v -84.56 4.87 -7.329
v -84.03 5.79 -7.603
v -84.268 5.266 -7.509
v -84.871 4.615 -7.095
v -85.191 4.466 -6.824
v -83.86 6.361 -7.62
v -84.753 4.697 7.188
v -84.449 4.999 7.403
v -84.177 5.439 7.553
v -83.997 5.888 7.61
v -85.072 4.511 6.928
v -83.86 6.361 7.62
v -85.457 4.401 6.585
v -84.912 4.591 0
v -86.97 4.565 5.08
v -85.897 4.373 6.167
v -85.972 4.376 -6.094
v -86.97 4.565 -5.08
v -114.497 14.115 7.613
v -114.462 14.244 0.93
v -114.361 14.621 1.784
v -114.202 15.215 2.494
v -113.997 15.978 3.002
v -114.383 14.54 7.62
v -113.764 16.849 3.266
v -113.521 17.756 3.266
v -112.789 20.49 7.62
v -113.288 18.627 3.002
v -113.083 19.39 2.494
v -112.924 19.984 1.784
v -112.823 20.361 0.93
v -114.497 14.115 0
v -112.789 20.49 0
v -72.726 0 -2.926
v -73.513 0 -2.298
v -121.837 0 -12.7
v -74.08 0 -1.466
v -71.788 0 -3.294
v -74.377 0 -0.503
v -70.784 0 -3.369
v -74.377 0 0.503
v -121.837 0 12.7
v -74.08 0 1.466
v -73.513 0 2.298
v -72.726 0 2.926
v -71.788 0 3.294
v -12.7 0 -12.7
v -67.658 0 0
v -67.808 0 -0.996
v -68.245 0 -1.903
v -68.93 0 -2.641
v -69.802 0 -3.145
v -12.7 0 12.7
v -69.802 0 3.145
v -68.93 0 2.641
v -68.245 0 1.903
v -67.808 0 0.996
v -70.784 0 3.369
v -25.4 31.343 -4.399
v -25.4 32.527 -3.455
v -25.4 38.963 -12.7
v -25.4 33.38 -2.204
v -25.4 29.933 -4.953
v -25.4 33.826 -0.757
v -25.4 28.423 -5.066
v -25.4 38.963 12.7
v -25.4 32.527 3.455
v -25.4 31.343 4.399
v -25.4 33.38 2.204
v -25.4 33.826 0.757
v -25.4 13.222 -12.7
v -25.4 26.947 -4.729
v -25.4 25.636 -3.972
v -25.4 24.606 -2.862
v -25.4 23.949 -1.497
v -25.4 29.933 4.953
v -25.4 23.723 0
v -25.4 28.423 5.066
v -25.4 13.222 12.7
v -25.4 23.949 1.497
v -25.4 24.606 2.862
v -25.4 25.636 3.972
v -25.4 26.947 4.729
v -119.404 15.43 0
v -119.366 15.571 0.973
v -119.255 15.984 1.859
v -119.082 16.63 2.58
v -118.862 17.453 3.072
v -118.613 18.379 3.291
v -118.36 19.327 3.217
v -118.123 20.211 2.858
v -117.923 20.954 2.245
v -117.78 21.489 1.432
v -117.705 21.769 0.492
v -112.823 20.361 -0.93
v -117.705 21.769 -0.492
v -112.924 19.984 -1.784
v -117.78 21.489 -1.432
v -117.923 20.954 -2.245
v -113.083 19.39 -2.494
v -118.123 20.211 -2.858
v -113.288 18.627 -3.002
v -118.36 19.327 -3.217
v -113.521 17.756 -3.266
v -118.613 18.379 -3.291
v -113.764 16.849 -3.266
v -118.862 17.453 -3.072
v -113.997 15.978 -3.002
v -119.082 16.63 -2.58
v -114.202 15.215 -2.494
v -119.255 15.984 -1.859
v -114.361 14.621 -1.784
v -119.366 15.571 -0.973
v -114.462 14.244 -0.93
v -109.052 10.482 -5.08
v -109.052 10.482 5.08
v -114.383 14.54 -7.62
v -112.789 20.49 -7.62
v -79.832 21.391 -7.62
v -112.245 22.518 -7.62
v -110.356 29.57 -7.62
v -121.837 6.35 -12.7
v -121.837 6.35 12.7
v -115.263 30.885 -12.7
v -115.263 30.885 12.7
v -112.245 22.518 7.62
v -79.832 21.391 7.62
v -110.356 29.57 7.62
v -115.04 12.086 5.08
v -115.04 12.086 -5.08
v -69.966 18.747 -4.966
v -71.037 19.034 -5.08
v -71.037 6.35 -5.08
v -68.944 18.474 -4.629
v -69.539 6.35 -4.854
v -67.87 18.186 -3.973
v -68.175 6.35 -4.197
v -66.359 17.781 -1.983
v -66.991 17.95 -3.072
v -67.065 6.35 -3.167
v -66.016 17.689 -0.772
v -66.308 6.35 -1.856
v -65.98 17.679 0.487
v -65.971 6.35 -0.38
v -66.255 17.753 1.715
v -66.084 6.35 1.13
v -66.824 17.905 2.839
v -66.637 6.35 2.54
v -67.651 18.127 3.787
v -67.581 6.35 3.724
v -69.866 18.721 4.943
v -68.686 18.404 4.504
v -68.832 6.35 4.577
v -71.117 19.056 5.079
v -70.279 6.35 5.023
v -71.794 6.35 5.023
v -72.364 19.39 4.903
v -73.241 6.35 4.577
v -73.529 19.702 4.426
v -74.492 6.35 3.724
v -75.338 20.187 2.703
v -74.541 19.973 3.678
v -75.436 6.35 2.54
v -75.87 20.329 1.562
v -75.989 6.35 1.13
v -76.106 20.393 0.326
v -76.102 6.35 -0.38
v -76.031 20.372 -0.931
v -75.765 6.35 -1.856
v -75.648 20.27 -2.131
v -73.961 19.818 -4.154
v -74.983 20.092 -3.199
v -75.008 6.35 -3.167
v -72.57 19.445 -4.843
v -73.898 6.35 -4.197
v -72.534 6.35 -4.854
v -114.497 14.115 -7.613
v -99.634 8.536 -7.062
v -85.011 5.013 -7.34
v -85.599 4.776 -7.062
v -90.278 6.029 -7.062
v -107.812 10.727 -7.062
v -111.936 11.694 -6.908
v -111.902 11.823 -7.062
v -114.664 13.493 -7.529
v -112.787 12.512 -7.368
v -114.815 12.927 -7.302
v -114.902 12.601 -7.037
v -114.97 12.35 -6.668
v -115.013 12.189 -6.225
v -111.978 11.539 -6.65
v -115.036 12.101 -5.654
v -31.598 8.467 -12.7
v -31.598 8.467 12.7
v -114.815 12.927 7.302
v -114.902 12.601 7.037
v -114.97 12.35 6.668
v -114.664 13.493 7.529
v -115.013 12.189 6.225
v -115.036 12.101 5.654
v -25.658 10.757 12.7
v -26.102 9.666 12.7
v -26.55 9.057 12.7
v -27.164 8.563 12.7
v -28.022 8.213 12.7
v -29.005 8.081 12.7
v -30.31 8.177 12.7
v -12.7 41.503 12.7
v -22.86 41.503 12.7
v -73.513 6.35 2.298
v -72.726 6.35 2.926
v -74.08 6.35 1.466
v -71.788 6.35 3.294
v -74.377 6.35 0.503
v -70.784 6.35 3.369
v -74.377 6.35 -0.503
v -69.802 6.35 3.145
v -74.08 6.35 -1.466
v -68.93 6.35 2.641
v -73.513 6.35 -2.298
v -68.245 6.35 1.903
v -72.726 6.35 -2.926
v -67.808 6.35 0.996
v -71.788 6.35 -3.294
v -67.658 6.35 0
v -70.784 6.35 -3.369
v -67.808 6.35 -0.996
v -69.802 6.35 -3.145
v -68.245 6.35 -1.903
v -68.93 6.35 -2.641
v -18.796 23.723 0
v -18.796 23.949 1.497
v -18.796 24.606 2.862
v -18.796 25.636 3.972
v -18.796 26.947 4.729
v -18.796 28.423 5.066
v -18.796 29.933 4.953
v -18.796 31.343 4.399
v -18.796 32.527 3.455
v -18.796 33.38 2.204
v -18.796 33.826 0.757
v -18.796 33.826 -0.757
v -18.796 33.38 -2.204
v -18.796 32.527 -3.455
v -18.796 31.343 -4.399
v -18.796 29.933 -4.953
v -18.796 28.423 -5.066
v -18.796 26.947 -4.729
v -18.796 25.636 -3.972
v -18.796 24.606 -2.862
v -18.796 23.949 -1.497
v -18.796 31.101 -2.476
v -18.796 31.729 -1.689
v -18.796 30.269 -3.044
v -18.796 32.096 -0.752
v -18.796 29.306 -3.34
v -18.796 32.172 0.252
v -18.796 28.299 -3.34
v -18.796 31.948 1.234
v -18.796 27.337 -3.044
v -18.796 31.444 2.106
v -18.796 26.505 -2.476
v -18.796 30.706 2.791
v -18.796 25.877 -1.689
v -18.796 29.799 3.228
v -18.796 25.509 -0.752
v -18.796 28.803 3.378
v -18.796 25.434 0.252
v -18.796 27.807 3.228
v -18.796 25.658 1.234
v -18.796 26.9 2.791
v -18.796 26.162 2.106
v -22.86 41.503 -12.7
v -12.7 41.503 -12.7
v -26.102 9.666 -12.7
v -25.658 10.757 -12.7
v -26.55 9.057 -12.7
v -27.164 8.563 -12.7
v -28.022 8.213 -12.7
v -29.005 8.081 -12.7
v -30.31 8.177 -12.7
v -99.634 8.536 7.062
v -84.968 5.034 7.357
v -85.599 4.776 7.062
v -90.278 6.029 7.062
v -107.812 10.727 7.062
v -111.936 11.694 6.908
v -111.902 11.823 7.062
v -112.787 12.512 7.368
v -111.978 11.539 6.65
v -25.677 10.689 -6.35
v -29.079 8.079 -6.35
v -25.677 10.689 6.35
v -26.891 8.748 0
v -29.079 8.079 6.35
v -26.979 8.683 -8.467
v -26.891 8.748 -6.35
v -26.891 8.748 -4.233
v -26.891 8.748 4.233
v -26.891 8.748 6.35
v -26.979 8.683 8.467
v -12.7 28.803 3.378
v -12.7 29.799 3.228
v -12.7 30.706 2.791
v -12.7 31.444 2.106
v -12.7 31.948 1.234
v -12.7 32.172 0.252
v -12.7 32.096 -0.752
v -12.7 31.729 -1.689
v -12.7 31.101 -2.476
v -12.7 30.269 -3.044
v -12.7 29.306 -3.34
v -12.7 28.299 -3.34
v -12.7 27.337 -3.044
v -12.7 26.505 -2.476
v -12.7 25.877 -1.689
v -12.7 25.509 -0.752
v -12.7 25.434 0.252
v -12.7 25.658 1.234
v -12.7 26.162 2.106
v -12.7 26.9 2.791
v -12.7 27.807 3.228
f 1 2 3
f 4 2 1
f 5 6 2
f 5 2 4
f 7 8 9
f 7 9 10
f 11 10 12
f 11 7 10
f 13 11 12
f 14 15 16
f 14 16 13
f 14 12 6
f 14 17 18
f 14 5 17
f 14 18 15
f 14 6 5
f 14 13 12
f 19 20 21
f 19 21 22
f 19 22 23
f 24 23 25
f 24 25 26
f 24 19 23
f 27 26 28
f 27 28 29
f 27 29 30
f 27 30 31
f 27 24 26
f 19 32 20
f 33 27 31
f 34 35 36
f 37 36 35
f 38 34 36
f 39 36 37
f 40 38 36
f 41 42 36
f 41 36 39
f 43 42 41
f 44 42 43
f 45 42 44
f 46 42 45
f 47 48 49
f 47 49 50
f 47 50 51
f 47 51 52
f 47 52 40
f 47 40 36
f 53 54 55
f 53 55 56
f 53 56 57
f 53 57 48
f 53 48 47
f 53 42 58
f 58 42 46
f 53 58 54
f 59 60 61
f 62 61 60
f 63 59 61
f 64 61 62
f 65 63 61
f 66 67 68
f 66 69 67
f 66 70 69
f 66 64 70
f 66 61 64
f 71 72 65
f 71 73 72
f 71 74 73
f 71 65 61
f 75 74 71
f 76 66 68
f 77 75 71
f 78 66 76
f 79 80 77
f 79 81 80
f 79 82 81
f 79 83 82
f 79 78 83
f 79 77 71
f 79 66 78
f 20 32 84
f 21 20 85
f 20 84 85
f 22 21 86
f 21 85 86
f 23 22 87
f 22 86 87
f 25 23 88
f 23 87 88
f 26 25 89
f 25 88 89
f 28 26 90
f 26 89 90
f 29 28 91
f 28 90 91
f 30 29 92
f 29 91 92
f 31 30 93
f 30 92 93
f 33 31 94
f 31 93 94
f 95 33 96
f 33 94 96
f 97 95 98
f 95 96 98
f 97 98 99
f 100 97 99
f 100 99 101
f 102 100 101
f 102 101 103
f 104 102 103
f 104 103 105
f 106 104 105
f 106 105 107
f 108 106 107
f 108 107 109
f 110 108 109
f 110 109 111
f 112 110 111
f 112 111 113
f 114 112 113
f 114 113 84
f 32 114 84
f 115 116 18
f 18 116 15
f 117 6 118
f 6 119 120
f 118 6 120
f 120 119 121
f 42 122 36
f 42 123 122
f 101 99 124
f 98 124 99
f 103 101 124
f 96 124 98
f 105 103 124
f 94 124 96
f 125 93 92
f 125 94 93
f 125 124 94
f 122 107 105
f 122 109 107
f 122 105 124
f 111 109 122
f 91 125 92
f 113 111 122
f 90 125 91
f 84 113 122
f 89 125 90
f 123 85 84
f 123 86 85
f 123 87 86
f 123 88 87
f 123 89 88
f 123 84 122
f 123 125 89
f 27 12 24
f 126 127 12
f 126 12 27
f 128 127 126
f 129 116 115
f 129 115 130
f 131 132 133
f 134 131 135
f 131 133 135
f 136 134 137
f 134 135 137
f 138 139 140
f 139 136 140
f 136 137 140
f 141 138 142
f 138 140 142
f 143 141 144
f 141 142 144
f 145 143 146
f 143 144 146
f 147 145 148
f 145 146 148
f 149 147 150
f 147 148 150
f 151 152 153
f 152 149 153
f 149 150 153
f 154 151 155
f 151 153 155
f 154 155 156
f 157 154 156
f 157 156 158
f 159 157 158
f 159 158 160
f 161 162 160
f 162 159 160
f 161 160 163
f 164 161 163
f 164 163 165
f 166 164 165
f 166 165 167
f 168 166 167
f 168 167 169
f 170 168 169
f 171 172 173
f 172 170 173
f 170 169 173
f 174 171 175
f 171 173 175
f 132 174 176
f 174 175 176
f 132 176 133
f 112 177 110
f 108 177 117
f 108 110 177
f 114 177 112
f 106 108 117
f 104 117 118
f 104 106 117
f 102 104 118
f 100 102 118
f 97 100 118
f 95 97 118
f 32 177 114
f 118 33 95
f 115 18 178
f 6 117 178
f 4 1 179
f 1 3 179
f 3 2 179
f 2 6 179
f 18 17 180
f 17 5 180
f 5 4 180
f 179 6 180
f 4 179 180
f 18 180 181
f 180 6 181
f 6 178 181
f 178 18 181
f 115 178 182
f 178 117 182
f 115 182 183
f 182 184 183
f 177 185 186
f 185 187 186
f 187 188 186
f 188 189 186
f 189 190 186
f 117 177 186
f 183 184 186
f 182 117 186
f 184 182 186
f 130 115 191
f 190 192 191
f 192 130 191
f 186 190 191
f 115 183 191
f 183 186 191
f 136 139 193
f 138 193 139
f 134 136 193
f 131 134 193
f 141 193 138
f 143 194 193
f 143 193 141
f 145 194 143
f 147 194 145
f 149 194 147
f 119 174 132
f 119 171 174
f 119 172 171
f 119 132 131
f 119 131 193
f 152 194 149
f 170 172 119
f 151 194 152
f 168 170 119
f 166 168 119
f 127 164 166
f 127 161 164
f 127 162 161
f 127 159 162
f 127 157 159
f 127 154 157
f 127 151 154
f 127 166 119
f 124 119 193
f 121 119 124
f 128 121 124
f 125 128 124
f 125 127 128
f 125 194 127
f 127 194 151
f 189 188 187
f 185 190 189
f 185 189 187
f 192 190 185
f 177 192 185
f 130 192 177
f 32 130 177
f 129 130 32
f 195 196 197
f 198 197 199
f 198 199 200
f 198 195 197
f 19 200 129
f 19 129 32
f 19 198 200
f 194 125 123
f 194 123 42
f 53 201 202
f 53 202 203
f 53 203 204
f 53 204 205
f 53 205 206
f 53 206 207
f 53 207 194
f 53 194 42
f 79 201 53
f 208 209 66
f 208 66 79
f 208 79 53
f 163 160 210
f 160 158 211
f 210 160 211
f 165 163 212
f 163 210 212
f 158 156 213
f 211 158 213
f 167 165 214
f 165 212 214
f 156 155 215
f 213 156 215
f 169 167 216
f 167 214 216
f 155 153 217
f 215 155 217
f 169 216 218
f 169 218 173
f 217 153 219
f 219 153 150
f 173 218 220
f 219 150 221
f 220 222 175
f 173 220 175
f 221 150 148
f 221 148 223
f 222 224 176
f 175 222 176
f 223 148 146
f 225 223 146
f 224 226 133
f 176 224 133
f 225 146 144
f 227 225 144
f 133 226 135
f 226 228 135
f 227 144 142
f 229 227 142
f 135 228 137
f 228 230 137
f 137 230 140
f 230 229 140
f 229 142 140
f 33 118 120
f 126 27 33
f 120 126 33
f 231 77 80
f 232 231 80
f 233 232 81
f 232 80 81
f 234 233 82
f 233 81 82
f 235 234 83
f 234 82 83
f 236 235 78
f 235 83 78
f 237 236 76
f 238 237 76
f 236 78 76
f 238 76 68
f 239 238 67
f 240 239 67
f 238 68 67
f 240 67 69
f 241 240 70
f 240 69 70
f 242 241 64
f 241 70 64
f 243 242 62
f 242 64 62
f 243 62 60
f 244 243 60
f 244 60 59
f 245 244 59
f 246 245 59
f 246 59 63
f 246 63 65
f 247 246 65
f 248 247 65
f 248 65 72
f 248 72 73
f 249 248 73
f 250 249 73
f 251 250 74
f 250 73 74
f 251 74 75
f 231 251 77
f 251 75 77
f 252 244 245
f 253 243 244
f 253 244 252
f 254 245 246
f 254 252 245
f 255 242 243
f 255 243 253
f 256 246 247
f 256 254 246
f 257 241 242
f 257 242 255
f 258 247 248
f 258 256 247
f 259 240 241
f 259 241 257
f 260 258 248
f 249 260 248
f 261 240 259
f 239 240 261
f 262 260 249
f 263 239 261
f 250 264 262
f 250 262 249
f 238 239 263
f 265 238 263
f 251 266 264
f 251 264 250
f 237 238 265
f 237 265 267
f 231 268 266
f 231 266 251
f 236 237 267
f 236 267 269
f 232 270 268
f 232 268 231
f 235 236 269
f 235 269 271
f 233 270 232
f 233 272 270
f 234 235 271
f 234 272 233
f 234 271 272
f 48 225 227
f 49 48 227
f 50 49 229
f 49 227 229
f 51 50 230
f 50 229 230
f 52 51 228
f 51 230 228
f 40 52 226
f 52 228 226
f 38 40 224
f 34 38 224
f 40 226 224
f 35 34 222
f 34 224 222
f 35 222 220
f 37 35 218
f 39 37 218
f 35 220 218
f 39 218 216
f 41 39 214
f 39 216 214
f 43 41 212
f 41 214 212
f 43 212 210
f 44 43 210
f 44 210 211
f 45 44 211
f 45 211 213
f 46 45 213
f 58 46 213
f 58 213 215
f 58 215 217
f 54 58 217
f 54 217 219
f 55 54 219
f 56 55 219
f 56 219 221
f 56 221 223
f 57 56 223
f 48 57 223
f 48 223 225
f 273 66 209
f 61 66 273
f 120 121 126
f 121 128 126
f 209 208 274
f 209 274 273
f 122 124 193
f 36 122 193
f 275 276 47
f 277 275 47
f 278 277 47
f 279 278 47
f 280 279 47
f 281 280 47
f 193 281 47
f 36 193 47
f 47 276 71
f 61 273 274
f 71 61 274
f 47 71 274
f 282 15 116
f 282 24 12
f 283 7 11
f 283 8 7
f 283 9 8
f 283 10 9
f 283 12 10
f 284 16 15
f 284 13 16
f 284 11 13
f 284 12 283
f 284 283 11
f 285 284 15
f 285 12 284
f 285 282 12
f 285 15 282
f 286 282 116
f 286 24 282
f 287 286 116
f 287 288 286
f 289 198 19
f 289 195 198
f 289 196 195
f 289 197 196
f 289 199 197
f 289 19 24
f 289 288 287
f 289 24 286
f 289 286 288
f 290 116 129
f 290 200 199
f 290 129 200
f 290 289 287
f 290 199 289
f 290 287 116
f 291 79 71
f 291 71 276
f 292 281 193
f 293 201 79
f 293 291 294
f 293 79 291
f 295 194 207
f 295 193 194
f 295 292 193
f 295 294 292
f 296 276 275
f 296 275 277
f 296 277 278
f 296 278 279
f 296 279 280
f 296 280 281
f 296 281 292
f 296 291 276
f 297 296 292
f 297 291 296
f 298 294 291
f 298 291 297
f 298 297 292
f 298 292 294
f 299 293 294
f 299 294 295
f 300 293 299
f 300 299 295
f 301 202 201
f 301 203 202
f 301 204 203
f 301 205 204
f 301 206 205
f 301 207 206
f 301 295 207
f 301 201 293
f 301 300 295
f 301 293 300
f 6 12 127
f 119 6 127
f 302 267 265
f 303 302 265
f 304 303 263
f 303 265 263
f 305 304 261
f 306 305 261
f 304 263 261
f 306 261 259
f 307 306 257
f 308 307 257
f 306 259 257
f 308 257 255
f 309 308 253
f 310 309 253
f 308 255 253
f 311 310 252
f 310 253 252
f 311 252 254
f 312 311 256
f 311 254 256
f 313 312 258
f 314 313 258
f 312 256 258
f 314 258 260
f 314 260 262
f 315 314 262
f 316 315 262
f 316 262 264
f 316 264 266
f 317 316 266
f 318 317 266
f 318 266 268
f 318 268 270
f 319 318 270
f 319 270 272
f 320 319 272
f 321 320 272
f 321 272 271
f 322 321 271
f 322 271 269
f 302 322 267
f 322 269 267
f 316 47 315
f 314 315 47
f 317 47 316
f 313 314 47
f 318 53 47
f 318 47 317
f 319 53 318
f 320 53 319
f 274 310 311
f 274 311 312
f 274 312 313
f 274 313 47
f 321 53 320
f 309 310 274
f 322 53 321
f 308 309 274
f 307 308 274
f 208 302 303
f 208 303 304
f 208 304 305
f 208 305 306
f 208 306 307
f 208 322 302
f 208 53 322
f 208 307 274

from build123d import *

# Parameters (mm, degrees)
BOSS_EXTRUDE2_DEPTH         = 12.7
CUT_EXTRUDE1_DEPTH          = 7.62
SKETCH3_R                   = 3.3
CUT_EXTRUDE3_DEPTH          = 5.08
FILLET1_SIZE                = 2.54
F_1_4_CLEARANCE_HOLE1_D     = 6.7564
SKETCH8_R                   = 5.08
CUT_EXTRUDE4_DEPTH          = 125.929525349
CUT_EXTRUDE5_DEPTH          = 129.230913422
BOSS_EXTRUDE3_DEPTH         = 25.4
F_1_4_CLEARANCE_HOLE2_D     = 6.7564
F_1_4_CLEARANCE_HOLE2_DEPTH = 12.7
F_1_4_CLEARANCE_HOLE2_TIP   = 2.029827343
SKETCH14_R                  = 5.08
CUT_EXTRUDE6_DEPTH          = 6.604
CHAMFER1_SIZE               = 2.54


with BuildPart() as part:
    # Sketch1 → Boss-Extrude2 (new, symmetric)
    with BuildSketch(Plane.XY):
        Polygon((-121.836586579, 6.35), (-121.836586579, 0), (0, 0), (-115.262582833, 30.884515988), align=None)
    extrude(amount=BOSS_EXTRUDE2_DEPTH, both=True)

    # Sketch2 → Cut-Extrude1 (cut, symmetric)
    with BuildSketch(Plane.XY):
        Polygon((-112.78857866, 20.490012472), (-112.245058665, 22.518456707), (-106.256318542, 20.913778627), (-109.051564229, 10.481779703), (-115.040304352, 12.086457783), (-114.496784358, 14.114902018), align=None)
        Polygon((-79.832423525, 21.391033413), (-110.355679636, 29.569715239), (-112.245058665, 22.518456707), (-106.256318542, 20.913778627), (-109.051564229, 10.481779703), (-84.517048242, 3.907775958), align=None)
    extrude(amount=CUT_EXTRUDE1_DEPTH, both=True, mode=Mode.SUBTRACT)

    # Sketch3 → Cut-Extrude3 (cut)
    with BuildSketch(Plane(origin=(-115.262582833, 30.884515988, 0), x_dir=(0, 0, 1), z_dir=(-0.96592582628907, 0.25881904510251447, 0))):
        with Locations(Location((0, -12.7, 0), (0, 0, 270))):
            Circle(SKETCH3_R)
    extrude(amount=-CUT_EXTRUDE3_DEPTH, mode=Mode.SUBTRACT)

    # Fillet1
    # a fillet whose section is not a circle: 2.54 mm, written as the material it adds along each edge
    with BuildSketch(Plane(origin=(-84.517048242, 3.907775958, 7.62), x_dir=(0.25881904510251297, 0.9659258262890703, 0), z_dir=(0, 0, -1))) as fillet1_piece_1:
        with BuildLine():
            add(Edge.make_bspline([(FILLET1_SIZE, 0), (FILLET1_SIZE * 0.831801948466, 0), (FILLET1_SIZE * 0.663603896932, 0), (FILLET1_SIZE * 0.292893218813, -FILLET1_SIZE * 0.0716919198361), (FILLET1_SIZE * 0.0716919198361, -FILLET1_SIZE * 0.292893218813), (0, -FILLET1_SIZE * 0.663603896932), (0, -FILLET1_SIZE * 0.831801948466), (0, -FILLET1_SIZE)], knots=[0, 0, 0, 0, 0, 0, 0.5, 0.5, 1, 1, 1, 1, 1, 1], degree=5))
            Line((0, -FILLET1_SIZE), (0, 0))
            Line((0, 0), (FILLET1_SIZE, 0))
        make_face()
    extrude(amount=15.24)
    with BuildSketch(Plane(origin=(-115.040304352, 12.086457783, 7.62), x_dir=(0.25881904510251585, 0.9659258262890695, 0), z_dir=(0.9659258262890696, -0.2588190451025158, 0))) as fillet1_piece_2:
        with BuildLine():
            add(Edge.make_bspline([(FILLET1_SIZE, 0), (FILLET1_SIZE * 0.831801948466, 0), (FILLET1_SIZE * 0.663603896932, 0), (FILLET1_SIZE * 0.292893218813, -FILLET1_SIZE * 0.0716919198361), (FILLET1_SIZE * 0.0716919198361, -FILLET1_SIZE * 0.292893218813), (0, -FILLET1_SIZE * 0.663603896932), (0, -FILLET1_SIZE * 0.831801948466), (0, -FILLET1_SIZE)], knots=[0, 0, 0, 0, 0, 0, 0.5, 0.5, 1, 1, 1, 1, 1, 1], degree=5))
            Line((0, -FILLET1_SIZE), (0, 0))
            Line((0, 0), (FILLET1_SIZE, 0))
        make_face()
    extrude(amount=37.95)
    with BuildSketch(Plane(origin=(-115.040304352, 12.086457783, -7.62), x_dir=(0.25881904510251585, 0.9659258262890695, 0), z_dir=(0.9659258262890696, -0.2588190451025158, 0))) as fillet1_piece_3:
        with BuildLine():
            add(Edge.make_bspline([(FILLET1_SIZE, 0), (FILLET1_SIZE * 0.831801948466, 0), (FILLET1_SIZE * 0.663603896932, 0), (FILLET1_SIZE * 0.292893218813, FILLET1_SIZE * 0.0716919198361), (FILLET1_SIZE * 0.0716919198361, FILLET1_SIZE * 0.292893218813), (0, FILLET1_SIZE * 0.663603896932), (0, FILLET1_SIZE * 0.831801948466), (0, FILLET1_SIZE)], knots=[0, 0, 0, 0, 0, 0, 0.5, 0.5, 1, 1, 1, 1, 1, 1], degree=5))
            Line((0, FILLET1_SIZE), (0, 0))
            Line((0, 0), (FILLET1_SIZE, 0))
        make_face()
    extrude(amount=37.95)

    # 1/4 Clearance Hole1 (through all)
    with Locations(Plane(origin=(0, 0, 0), x_dir=(-1, 0, 0), z_dir=(0, -1, 0))):
        with Locations((71.036586579, 0)):
            Hole(F_1_4_CLEARANCE_HOLE1_D / 2)

    # Sketch8 → Cut-Extrude4 (cut, through all)
    with BuildSketch(Plane(origin=(0, 6.35, 0), x_dir=(-1, 0, 0), z_dir=(0, -1, 0))):
        with Locations(Location((71.036586579, 0, 0), (0, 0, 90))):
            Circle(SKETCH8_R)
    extrude(amount=-CUT_EXTRUDE4_DEPTH, mode=Mode.SUBTRACT)

    # Sketch9 → Cut-Extrude5 (cut, through all)
    with BuildSketch(Plane.XY.offset(12.7)):
        Polygon((-12.7, 3.402954744), (-12.7, 0), (0, 0), align=None)
    extrude(amount=-CUT_EXTRUDE5_DEPTH, mode=Mode.SUBTRACT)

    # Sketch10 → Boss-Extrude3 (add)
    with BuildSketch(Plane.XY.offset(12.7)):
        Polygon((-12.7, 3.402954744), (-12.7, 41.502954744), (-25.4, 41.502954744), (-25.4, 6.805909488), align=None)
    extrude(amount=-BOSS_EXTRUDE3_DEPTH)

    # 1/4 Clearance Hole2
    with Locations(Plane(origin=(-12.7, 0, 0), x_dir=(0, 0, -1), z_dir=(1, 0, 0))):
        with Locations((0, 28.802954744)):
            Hole(F_1_4_CLEARANCE_HOLE2_D / 2, depth=F_1_4_CLEARANCE_HOLE2_DEPTH)
            with Locations((0, 0, -(F_1_4_CLEARANCE_HOLE2_DEPTH + F_1_4_CLEARANCE_HOLE2_TIP / 2))):  # 118° drill point
                Cone(0, F_1_4_CLEARANCE_HOLE2_D / 2, F_1_4_CLEARANCE_HOLE2_TIP, mode=Mode.SUBTRACT)

    # Sketch14 → Cut-Extrude6 (cut)
    with BuildSketch(Plane.ZY.offset(25.4)):
        with Locations(Location((0, 28.802954744, 0), (0, 0, 270))):
            Circle(SKETCH14_R)
    extrude(amount=-CUT_EXTRUDE6_DEPTH, mode=Mode.SUBTRACT)

    # Chamfer1
    chamfer1_edges = [part.edges().sort_by_distance(p)[0] for p in [
        (-25.4, 41.502954744, 0),
    ]]
    chamfer(chamfer1_edges, length=CHAMFER1_SIZE)

    # Fillet2
    # a fillet whose section is not a circle: 5.08 mm, written as the material it adds along each edge (its section moved 0.00015 mm through the faces so that the kernel can cut it)
    with BuildSketch(Plane(origin=(-25.4, 6.805909488, 12.7), x_dir=(2.2657292946534733e-05, 0.9999999997433235, 0), z_dir=(0, 0, -1))) as fillet2_piece_1:
        with BuildLine():
            add(Edge.make_bspline([(6.620384896, 0), (5.560159502, 2.4022e-05), (4.499934108, 4.8044e-05), (2.201778974, -0.538520049), (1.089942696, -1.987425322), (1.164425276, -4.346667776), (1.438808597, -5.370773083), (1.713191917, -6.39487839)], knots=[0, 0, 0, 0, 0, 0, 0.5, 0.5, 1, 1, 1, 1, 1, 1], degree=5))
            Line((1.713191917, -6.39487839), (1.615053258, -6.421172181))
            ThreePointArc((1.615053258, -6.421172181), (0.758529744, -3.223713577), (-0.09813866, -0.026293791))
            Line((-0.09813866, -0.026293791), (2.302e-06, 0.1016))
            ThreePointArc((2.302e-06, 0.1016), (3.310194748, 0.101525), (6.620387198, 0.1016))
            Line((6.620387198, 0.1016), (6.620384896, 0))
        make_face()
    extrude(amount=25.4)


solid = part.part
